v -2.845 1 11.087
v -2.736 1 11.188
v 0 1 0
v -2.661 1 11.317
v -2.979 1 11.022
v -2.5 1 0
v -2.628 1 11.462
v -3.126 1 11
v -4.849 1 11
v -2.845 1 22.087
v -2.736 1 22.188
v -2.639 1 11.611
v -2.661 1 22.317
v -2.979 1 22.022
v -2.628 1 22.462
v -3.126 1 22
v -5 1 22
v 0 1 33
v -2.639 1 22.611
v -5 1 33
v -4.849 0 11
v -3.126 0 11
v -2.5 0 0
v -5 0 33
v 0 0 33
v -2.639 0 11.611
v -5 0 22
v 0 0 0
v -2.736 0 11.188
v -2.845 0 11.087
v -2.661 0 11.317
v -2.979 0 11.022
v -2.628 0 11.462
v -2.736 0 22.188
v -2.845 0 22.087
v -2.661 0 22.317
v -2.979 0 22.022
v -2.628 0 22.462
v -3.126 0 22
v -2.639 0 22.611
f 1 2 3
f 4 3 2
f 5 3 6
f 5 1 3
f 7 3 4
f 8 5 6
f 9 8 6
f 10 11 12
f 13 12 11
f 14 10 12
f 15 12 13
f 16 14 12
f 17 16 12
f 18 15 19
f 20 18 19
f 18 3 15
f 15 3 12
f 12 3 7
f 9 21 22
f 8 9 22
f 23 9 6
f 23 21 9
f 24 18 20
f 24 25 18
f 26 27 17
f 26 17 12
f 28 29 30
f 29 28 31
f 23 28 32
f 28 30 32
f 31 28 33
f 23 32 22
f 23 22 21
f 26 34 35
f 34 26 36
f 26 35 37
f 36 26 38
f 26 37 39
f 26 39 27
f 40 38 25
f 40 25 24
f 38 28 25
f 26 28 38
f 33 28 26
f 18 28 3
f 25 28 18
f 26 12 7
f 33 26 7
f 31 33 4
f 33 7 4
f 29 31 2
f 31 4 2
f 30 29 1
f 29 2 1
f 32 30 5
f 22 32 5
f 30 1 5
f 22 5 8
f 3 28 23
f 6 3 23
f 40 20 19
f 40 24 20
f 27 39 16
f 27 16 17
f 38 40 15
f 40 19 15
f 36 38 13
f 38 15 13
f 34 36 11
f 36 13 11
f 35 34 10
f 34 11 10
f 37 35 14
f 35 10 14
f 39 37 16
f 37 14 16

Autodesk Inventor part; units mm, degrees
ref_plane "YZ Plane" through (0, 0, 0) normal (1, 0, 0) x (0, 1, 0)
ref_plane "XZ Plane" through (0, 0, 0) normal (0, 1, 0) x (-1, 0, 0)
ref_plane "XY Plane" through (0, 0, 0) normal (0, 0, 1) x (1, 0, 0)
sketch "Sketch1" plane through (0, 0, 0) normal (0, 1, 0) x (-1, 0, 0)
  line L0 (0, 0) -> (0, 33)
  line L1 (0, 33) -> (5, 33)
  line L2 (0, 0) -> (0, 11) construction
  line L3 (0, 11) -> (0, 22) construction
  line L4 (0, 22) -> (0, 33) construction
  line L5 (0, 22) -> (5, 22) construction
  line L6 (0, 11) -> (5, 11) construction
  line L7 (5, 33) -> (2.5, 22)
  line L8 (2.5, 22) -> (5, 22)
  line L9 (5, 22) -> (2.5, 11)
  line L10 (4.8494, 11) -> (2.5, 11)
  line L11 (0, 0) -> (5, 0) construction
  line L12 (4.8494, 11) -> (2.5, 0)
  line L13 (0, 0) -> (2.5, 0)
  dimension "d0" = 33
  dimension "d1" = 5
  dimension "d13" = 11
  dimension "d14" = 11
  dimension "d15" = 5
  dimension "d16" = 5
  dimension "d17" = 5
extrude "Extrusion1" add sketch "Sketch1" along normal blind 1
fillet "Fillet1" radius 0.5 2 edges at (-2.5, 0.5, 11) (-2.5, 0.5, 22)
properties part number "spikyboi" material "Titanium"
